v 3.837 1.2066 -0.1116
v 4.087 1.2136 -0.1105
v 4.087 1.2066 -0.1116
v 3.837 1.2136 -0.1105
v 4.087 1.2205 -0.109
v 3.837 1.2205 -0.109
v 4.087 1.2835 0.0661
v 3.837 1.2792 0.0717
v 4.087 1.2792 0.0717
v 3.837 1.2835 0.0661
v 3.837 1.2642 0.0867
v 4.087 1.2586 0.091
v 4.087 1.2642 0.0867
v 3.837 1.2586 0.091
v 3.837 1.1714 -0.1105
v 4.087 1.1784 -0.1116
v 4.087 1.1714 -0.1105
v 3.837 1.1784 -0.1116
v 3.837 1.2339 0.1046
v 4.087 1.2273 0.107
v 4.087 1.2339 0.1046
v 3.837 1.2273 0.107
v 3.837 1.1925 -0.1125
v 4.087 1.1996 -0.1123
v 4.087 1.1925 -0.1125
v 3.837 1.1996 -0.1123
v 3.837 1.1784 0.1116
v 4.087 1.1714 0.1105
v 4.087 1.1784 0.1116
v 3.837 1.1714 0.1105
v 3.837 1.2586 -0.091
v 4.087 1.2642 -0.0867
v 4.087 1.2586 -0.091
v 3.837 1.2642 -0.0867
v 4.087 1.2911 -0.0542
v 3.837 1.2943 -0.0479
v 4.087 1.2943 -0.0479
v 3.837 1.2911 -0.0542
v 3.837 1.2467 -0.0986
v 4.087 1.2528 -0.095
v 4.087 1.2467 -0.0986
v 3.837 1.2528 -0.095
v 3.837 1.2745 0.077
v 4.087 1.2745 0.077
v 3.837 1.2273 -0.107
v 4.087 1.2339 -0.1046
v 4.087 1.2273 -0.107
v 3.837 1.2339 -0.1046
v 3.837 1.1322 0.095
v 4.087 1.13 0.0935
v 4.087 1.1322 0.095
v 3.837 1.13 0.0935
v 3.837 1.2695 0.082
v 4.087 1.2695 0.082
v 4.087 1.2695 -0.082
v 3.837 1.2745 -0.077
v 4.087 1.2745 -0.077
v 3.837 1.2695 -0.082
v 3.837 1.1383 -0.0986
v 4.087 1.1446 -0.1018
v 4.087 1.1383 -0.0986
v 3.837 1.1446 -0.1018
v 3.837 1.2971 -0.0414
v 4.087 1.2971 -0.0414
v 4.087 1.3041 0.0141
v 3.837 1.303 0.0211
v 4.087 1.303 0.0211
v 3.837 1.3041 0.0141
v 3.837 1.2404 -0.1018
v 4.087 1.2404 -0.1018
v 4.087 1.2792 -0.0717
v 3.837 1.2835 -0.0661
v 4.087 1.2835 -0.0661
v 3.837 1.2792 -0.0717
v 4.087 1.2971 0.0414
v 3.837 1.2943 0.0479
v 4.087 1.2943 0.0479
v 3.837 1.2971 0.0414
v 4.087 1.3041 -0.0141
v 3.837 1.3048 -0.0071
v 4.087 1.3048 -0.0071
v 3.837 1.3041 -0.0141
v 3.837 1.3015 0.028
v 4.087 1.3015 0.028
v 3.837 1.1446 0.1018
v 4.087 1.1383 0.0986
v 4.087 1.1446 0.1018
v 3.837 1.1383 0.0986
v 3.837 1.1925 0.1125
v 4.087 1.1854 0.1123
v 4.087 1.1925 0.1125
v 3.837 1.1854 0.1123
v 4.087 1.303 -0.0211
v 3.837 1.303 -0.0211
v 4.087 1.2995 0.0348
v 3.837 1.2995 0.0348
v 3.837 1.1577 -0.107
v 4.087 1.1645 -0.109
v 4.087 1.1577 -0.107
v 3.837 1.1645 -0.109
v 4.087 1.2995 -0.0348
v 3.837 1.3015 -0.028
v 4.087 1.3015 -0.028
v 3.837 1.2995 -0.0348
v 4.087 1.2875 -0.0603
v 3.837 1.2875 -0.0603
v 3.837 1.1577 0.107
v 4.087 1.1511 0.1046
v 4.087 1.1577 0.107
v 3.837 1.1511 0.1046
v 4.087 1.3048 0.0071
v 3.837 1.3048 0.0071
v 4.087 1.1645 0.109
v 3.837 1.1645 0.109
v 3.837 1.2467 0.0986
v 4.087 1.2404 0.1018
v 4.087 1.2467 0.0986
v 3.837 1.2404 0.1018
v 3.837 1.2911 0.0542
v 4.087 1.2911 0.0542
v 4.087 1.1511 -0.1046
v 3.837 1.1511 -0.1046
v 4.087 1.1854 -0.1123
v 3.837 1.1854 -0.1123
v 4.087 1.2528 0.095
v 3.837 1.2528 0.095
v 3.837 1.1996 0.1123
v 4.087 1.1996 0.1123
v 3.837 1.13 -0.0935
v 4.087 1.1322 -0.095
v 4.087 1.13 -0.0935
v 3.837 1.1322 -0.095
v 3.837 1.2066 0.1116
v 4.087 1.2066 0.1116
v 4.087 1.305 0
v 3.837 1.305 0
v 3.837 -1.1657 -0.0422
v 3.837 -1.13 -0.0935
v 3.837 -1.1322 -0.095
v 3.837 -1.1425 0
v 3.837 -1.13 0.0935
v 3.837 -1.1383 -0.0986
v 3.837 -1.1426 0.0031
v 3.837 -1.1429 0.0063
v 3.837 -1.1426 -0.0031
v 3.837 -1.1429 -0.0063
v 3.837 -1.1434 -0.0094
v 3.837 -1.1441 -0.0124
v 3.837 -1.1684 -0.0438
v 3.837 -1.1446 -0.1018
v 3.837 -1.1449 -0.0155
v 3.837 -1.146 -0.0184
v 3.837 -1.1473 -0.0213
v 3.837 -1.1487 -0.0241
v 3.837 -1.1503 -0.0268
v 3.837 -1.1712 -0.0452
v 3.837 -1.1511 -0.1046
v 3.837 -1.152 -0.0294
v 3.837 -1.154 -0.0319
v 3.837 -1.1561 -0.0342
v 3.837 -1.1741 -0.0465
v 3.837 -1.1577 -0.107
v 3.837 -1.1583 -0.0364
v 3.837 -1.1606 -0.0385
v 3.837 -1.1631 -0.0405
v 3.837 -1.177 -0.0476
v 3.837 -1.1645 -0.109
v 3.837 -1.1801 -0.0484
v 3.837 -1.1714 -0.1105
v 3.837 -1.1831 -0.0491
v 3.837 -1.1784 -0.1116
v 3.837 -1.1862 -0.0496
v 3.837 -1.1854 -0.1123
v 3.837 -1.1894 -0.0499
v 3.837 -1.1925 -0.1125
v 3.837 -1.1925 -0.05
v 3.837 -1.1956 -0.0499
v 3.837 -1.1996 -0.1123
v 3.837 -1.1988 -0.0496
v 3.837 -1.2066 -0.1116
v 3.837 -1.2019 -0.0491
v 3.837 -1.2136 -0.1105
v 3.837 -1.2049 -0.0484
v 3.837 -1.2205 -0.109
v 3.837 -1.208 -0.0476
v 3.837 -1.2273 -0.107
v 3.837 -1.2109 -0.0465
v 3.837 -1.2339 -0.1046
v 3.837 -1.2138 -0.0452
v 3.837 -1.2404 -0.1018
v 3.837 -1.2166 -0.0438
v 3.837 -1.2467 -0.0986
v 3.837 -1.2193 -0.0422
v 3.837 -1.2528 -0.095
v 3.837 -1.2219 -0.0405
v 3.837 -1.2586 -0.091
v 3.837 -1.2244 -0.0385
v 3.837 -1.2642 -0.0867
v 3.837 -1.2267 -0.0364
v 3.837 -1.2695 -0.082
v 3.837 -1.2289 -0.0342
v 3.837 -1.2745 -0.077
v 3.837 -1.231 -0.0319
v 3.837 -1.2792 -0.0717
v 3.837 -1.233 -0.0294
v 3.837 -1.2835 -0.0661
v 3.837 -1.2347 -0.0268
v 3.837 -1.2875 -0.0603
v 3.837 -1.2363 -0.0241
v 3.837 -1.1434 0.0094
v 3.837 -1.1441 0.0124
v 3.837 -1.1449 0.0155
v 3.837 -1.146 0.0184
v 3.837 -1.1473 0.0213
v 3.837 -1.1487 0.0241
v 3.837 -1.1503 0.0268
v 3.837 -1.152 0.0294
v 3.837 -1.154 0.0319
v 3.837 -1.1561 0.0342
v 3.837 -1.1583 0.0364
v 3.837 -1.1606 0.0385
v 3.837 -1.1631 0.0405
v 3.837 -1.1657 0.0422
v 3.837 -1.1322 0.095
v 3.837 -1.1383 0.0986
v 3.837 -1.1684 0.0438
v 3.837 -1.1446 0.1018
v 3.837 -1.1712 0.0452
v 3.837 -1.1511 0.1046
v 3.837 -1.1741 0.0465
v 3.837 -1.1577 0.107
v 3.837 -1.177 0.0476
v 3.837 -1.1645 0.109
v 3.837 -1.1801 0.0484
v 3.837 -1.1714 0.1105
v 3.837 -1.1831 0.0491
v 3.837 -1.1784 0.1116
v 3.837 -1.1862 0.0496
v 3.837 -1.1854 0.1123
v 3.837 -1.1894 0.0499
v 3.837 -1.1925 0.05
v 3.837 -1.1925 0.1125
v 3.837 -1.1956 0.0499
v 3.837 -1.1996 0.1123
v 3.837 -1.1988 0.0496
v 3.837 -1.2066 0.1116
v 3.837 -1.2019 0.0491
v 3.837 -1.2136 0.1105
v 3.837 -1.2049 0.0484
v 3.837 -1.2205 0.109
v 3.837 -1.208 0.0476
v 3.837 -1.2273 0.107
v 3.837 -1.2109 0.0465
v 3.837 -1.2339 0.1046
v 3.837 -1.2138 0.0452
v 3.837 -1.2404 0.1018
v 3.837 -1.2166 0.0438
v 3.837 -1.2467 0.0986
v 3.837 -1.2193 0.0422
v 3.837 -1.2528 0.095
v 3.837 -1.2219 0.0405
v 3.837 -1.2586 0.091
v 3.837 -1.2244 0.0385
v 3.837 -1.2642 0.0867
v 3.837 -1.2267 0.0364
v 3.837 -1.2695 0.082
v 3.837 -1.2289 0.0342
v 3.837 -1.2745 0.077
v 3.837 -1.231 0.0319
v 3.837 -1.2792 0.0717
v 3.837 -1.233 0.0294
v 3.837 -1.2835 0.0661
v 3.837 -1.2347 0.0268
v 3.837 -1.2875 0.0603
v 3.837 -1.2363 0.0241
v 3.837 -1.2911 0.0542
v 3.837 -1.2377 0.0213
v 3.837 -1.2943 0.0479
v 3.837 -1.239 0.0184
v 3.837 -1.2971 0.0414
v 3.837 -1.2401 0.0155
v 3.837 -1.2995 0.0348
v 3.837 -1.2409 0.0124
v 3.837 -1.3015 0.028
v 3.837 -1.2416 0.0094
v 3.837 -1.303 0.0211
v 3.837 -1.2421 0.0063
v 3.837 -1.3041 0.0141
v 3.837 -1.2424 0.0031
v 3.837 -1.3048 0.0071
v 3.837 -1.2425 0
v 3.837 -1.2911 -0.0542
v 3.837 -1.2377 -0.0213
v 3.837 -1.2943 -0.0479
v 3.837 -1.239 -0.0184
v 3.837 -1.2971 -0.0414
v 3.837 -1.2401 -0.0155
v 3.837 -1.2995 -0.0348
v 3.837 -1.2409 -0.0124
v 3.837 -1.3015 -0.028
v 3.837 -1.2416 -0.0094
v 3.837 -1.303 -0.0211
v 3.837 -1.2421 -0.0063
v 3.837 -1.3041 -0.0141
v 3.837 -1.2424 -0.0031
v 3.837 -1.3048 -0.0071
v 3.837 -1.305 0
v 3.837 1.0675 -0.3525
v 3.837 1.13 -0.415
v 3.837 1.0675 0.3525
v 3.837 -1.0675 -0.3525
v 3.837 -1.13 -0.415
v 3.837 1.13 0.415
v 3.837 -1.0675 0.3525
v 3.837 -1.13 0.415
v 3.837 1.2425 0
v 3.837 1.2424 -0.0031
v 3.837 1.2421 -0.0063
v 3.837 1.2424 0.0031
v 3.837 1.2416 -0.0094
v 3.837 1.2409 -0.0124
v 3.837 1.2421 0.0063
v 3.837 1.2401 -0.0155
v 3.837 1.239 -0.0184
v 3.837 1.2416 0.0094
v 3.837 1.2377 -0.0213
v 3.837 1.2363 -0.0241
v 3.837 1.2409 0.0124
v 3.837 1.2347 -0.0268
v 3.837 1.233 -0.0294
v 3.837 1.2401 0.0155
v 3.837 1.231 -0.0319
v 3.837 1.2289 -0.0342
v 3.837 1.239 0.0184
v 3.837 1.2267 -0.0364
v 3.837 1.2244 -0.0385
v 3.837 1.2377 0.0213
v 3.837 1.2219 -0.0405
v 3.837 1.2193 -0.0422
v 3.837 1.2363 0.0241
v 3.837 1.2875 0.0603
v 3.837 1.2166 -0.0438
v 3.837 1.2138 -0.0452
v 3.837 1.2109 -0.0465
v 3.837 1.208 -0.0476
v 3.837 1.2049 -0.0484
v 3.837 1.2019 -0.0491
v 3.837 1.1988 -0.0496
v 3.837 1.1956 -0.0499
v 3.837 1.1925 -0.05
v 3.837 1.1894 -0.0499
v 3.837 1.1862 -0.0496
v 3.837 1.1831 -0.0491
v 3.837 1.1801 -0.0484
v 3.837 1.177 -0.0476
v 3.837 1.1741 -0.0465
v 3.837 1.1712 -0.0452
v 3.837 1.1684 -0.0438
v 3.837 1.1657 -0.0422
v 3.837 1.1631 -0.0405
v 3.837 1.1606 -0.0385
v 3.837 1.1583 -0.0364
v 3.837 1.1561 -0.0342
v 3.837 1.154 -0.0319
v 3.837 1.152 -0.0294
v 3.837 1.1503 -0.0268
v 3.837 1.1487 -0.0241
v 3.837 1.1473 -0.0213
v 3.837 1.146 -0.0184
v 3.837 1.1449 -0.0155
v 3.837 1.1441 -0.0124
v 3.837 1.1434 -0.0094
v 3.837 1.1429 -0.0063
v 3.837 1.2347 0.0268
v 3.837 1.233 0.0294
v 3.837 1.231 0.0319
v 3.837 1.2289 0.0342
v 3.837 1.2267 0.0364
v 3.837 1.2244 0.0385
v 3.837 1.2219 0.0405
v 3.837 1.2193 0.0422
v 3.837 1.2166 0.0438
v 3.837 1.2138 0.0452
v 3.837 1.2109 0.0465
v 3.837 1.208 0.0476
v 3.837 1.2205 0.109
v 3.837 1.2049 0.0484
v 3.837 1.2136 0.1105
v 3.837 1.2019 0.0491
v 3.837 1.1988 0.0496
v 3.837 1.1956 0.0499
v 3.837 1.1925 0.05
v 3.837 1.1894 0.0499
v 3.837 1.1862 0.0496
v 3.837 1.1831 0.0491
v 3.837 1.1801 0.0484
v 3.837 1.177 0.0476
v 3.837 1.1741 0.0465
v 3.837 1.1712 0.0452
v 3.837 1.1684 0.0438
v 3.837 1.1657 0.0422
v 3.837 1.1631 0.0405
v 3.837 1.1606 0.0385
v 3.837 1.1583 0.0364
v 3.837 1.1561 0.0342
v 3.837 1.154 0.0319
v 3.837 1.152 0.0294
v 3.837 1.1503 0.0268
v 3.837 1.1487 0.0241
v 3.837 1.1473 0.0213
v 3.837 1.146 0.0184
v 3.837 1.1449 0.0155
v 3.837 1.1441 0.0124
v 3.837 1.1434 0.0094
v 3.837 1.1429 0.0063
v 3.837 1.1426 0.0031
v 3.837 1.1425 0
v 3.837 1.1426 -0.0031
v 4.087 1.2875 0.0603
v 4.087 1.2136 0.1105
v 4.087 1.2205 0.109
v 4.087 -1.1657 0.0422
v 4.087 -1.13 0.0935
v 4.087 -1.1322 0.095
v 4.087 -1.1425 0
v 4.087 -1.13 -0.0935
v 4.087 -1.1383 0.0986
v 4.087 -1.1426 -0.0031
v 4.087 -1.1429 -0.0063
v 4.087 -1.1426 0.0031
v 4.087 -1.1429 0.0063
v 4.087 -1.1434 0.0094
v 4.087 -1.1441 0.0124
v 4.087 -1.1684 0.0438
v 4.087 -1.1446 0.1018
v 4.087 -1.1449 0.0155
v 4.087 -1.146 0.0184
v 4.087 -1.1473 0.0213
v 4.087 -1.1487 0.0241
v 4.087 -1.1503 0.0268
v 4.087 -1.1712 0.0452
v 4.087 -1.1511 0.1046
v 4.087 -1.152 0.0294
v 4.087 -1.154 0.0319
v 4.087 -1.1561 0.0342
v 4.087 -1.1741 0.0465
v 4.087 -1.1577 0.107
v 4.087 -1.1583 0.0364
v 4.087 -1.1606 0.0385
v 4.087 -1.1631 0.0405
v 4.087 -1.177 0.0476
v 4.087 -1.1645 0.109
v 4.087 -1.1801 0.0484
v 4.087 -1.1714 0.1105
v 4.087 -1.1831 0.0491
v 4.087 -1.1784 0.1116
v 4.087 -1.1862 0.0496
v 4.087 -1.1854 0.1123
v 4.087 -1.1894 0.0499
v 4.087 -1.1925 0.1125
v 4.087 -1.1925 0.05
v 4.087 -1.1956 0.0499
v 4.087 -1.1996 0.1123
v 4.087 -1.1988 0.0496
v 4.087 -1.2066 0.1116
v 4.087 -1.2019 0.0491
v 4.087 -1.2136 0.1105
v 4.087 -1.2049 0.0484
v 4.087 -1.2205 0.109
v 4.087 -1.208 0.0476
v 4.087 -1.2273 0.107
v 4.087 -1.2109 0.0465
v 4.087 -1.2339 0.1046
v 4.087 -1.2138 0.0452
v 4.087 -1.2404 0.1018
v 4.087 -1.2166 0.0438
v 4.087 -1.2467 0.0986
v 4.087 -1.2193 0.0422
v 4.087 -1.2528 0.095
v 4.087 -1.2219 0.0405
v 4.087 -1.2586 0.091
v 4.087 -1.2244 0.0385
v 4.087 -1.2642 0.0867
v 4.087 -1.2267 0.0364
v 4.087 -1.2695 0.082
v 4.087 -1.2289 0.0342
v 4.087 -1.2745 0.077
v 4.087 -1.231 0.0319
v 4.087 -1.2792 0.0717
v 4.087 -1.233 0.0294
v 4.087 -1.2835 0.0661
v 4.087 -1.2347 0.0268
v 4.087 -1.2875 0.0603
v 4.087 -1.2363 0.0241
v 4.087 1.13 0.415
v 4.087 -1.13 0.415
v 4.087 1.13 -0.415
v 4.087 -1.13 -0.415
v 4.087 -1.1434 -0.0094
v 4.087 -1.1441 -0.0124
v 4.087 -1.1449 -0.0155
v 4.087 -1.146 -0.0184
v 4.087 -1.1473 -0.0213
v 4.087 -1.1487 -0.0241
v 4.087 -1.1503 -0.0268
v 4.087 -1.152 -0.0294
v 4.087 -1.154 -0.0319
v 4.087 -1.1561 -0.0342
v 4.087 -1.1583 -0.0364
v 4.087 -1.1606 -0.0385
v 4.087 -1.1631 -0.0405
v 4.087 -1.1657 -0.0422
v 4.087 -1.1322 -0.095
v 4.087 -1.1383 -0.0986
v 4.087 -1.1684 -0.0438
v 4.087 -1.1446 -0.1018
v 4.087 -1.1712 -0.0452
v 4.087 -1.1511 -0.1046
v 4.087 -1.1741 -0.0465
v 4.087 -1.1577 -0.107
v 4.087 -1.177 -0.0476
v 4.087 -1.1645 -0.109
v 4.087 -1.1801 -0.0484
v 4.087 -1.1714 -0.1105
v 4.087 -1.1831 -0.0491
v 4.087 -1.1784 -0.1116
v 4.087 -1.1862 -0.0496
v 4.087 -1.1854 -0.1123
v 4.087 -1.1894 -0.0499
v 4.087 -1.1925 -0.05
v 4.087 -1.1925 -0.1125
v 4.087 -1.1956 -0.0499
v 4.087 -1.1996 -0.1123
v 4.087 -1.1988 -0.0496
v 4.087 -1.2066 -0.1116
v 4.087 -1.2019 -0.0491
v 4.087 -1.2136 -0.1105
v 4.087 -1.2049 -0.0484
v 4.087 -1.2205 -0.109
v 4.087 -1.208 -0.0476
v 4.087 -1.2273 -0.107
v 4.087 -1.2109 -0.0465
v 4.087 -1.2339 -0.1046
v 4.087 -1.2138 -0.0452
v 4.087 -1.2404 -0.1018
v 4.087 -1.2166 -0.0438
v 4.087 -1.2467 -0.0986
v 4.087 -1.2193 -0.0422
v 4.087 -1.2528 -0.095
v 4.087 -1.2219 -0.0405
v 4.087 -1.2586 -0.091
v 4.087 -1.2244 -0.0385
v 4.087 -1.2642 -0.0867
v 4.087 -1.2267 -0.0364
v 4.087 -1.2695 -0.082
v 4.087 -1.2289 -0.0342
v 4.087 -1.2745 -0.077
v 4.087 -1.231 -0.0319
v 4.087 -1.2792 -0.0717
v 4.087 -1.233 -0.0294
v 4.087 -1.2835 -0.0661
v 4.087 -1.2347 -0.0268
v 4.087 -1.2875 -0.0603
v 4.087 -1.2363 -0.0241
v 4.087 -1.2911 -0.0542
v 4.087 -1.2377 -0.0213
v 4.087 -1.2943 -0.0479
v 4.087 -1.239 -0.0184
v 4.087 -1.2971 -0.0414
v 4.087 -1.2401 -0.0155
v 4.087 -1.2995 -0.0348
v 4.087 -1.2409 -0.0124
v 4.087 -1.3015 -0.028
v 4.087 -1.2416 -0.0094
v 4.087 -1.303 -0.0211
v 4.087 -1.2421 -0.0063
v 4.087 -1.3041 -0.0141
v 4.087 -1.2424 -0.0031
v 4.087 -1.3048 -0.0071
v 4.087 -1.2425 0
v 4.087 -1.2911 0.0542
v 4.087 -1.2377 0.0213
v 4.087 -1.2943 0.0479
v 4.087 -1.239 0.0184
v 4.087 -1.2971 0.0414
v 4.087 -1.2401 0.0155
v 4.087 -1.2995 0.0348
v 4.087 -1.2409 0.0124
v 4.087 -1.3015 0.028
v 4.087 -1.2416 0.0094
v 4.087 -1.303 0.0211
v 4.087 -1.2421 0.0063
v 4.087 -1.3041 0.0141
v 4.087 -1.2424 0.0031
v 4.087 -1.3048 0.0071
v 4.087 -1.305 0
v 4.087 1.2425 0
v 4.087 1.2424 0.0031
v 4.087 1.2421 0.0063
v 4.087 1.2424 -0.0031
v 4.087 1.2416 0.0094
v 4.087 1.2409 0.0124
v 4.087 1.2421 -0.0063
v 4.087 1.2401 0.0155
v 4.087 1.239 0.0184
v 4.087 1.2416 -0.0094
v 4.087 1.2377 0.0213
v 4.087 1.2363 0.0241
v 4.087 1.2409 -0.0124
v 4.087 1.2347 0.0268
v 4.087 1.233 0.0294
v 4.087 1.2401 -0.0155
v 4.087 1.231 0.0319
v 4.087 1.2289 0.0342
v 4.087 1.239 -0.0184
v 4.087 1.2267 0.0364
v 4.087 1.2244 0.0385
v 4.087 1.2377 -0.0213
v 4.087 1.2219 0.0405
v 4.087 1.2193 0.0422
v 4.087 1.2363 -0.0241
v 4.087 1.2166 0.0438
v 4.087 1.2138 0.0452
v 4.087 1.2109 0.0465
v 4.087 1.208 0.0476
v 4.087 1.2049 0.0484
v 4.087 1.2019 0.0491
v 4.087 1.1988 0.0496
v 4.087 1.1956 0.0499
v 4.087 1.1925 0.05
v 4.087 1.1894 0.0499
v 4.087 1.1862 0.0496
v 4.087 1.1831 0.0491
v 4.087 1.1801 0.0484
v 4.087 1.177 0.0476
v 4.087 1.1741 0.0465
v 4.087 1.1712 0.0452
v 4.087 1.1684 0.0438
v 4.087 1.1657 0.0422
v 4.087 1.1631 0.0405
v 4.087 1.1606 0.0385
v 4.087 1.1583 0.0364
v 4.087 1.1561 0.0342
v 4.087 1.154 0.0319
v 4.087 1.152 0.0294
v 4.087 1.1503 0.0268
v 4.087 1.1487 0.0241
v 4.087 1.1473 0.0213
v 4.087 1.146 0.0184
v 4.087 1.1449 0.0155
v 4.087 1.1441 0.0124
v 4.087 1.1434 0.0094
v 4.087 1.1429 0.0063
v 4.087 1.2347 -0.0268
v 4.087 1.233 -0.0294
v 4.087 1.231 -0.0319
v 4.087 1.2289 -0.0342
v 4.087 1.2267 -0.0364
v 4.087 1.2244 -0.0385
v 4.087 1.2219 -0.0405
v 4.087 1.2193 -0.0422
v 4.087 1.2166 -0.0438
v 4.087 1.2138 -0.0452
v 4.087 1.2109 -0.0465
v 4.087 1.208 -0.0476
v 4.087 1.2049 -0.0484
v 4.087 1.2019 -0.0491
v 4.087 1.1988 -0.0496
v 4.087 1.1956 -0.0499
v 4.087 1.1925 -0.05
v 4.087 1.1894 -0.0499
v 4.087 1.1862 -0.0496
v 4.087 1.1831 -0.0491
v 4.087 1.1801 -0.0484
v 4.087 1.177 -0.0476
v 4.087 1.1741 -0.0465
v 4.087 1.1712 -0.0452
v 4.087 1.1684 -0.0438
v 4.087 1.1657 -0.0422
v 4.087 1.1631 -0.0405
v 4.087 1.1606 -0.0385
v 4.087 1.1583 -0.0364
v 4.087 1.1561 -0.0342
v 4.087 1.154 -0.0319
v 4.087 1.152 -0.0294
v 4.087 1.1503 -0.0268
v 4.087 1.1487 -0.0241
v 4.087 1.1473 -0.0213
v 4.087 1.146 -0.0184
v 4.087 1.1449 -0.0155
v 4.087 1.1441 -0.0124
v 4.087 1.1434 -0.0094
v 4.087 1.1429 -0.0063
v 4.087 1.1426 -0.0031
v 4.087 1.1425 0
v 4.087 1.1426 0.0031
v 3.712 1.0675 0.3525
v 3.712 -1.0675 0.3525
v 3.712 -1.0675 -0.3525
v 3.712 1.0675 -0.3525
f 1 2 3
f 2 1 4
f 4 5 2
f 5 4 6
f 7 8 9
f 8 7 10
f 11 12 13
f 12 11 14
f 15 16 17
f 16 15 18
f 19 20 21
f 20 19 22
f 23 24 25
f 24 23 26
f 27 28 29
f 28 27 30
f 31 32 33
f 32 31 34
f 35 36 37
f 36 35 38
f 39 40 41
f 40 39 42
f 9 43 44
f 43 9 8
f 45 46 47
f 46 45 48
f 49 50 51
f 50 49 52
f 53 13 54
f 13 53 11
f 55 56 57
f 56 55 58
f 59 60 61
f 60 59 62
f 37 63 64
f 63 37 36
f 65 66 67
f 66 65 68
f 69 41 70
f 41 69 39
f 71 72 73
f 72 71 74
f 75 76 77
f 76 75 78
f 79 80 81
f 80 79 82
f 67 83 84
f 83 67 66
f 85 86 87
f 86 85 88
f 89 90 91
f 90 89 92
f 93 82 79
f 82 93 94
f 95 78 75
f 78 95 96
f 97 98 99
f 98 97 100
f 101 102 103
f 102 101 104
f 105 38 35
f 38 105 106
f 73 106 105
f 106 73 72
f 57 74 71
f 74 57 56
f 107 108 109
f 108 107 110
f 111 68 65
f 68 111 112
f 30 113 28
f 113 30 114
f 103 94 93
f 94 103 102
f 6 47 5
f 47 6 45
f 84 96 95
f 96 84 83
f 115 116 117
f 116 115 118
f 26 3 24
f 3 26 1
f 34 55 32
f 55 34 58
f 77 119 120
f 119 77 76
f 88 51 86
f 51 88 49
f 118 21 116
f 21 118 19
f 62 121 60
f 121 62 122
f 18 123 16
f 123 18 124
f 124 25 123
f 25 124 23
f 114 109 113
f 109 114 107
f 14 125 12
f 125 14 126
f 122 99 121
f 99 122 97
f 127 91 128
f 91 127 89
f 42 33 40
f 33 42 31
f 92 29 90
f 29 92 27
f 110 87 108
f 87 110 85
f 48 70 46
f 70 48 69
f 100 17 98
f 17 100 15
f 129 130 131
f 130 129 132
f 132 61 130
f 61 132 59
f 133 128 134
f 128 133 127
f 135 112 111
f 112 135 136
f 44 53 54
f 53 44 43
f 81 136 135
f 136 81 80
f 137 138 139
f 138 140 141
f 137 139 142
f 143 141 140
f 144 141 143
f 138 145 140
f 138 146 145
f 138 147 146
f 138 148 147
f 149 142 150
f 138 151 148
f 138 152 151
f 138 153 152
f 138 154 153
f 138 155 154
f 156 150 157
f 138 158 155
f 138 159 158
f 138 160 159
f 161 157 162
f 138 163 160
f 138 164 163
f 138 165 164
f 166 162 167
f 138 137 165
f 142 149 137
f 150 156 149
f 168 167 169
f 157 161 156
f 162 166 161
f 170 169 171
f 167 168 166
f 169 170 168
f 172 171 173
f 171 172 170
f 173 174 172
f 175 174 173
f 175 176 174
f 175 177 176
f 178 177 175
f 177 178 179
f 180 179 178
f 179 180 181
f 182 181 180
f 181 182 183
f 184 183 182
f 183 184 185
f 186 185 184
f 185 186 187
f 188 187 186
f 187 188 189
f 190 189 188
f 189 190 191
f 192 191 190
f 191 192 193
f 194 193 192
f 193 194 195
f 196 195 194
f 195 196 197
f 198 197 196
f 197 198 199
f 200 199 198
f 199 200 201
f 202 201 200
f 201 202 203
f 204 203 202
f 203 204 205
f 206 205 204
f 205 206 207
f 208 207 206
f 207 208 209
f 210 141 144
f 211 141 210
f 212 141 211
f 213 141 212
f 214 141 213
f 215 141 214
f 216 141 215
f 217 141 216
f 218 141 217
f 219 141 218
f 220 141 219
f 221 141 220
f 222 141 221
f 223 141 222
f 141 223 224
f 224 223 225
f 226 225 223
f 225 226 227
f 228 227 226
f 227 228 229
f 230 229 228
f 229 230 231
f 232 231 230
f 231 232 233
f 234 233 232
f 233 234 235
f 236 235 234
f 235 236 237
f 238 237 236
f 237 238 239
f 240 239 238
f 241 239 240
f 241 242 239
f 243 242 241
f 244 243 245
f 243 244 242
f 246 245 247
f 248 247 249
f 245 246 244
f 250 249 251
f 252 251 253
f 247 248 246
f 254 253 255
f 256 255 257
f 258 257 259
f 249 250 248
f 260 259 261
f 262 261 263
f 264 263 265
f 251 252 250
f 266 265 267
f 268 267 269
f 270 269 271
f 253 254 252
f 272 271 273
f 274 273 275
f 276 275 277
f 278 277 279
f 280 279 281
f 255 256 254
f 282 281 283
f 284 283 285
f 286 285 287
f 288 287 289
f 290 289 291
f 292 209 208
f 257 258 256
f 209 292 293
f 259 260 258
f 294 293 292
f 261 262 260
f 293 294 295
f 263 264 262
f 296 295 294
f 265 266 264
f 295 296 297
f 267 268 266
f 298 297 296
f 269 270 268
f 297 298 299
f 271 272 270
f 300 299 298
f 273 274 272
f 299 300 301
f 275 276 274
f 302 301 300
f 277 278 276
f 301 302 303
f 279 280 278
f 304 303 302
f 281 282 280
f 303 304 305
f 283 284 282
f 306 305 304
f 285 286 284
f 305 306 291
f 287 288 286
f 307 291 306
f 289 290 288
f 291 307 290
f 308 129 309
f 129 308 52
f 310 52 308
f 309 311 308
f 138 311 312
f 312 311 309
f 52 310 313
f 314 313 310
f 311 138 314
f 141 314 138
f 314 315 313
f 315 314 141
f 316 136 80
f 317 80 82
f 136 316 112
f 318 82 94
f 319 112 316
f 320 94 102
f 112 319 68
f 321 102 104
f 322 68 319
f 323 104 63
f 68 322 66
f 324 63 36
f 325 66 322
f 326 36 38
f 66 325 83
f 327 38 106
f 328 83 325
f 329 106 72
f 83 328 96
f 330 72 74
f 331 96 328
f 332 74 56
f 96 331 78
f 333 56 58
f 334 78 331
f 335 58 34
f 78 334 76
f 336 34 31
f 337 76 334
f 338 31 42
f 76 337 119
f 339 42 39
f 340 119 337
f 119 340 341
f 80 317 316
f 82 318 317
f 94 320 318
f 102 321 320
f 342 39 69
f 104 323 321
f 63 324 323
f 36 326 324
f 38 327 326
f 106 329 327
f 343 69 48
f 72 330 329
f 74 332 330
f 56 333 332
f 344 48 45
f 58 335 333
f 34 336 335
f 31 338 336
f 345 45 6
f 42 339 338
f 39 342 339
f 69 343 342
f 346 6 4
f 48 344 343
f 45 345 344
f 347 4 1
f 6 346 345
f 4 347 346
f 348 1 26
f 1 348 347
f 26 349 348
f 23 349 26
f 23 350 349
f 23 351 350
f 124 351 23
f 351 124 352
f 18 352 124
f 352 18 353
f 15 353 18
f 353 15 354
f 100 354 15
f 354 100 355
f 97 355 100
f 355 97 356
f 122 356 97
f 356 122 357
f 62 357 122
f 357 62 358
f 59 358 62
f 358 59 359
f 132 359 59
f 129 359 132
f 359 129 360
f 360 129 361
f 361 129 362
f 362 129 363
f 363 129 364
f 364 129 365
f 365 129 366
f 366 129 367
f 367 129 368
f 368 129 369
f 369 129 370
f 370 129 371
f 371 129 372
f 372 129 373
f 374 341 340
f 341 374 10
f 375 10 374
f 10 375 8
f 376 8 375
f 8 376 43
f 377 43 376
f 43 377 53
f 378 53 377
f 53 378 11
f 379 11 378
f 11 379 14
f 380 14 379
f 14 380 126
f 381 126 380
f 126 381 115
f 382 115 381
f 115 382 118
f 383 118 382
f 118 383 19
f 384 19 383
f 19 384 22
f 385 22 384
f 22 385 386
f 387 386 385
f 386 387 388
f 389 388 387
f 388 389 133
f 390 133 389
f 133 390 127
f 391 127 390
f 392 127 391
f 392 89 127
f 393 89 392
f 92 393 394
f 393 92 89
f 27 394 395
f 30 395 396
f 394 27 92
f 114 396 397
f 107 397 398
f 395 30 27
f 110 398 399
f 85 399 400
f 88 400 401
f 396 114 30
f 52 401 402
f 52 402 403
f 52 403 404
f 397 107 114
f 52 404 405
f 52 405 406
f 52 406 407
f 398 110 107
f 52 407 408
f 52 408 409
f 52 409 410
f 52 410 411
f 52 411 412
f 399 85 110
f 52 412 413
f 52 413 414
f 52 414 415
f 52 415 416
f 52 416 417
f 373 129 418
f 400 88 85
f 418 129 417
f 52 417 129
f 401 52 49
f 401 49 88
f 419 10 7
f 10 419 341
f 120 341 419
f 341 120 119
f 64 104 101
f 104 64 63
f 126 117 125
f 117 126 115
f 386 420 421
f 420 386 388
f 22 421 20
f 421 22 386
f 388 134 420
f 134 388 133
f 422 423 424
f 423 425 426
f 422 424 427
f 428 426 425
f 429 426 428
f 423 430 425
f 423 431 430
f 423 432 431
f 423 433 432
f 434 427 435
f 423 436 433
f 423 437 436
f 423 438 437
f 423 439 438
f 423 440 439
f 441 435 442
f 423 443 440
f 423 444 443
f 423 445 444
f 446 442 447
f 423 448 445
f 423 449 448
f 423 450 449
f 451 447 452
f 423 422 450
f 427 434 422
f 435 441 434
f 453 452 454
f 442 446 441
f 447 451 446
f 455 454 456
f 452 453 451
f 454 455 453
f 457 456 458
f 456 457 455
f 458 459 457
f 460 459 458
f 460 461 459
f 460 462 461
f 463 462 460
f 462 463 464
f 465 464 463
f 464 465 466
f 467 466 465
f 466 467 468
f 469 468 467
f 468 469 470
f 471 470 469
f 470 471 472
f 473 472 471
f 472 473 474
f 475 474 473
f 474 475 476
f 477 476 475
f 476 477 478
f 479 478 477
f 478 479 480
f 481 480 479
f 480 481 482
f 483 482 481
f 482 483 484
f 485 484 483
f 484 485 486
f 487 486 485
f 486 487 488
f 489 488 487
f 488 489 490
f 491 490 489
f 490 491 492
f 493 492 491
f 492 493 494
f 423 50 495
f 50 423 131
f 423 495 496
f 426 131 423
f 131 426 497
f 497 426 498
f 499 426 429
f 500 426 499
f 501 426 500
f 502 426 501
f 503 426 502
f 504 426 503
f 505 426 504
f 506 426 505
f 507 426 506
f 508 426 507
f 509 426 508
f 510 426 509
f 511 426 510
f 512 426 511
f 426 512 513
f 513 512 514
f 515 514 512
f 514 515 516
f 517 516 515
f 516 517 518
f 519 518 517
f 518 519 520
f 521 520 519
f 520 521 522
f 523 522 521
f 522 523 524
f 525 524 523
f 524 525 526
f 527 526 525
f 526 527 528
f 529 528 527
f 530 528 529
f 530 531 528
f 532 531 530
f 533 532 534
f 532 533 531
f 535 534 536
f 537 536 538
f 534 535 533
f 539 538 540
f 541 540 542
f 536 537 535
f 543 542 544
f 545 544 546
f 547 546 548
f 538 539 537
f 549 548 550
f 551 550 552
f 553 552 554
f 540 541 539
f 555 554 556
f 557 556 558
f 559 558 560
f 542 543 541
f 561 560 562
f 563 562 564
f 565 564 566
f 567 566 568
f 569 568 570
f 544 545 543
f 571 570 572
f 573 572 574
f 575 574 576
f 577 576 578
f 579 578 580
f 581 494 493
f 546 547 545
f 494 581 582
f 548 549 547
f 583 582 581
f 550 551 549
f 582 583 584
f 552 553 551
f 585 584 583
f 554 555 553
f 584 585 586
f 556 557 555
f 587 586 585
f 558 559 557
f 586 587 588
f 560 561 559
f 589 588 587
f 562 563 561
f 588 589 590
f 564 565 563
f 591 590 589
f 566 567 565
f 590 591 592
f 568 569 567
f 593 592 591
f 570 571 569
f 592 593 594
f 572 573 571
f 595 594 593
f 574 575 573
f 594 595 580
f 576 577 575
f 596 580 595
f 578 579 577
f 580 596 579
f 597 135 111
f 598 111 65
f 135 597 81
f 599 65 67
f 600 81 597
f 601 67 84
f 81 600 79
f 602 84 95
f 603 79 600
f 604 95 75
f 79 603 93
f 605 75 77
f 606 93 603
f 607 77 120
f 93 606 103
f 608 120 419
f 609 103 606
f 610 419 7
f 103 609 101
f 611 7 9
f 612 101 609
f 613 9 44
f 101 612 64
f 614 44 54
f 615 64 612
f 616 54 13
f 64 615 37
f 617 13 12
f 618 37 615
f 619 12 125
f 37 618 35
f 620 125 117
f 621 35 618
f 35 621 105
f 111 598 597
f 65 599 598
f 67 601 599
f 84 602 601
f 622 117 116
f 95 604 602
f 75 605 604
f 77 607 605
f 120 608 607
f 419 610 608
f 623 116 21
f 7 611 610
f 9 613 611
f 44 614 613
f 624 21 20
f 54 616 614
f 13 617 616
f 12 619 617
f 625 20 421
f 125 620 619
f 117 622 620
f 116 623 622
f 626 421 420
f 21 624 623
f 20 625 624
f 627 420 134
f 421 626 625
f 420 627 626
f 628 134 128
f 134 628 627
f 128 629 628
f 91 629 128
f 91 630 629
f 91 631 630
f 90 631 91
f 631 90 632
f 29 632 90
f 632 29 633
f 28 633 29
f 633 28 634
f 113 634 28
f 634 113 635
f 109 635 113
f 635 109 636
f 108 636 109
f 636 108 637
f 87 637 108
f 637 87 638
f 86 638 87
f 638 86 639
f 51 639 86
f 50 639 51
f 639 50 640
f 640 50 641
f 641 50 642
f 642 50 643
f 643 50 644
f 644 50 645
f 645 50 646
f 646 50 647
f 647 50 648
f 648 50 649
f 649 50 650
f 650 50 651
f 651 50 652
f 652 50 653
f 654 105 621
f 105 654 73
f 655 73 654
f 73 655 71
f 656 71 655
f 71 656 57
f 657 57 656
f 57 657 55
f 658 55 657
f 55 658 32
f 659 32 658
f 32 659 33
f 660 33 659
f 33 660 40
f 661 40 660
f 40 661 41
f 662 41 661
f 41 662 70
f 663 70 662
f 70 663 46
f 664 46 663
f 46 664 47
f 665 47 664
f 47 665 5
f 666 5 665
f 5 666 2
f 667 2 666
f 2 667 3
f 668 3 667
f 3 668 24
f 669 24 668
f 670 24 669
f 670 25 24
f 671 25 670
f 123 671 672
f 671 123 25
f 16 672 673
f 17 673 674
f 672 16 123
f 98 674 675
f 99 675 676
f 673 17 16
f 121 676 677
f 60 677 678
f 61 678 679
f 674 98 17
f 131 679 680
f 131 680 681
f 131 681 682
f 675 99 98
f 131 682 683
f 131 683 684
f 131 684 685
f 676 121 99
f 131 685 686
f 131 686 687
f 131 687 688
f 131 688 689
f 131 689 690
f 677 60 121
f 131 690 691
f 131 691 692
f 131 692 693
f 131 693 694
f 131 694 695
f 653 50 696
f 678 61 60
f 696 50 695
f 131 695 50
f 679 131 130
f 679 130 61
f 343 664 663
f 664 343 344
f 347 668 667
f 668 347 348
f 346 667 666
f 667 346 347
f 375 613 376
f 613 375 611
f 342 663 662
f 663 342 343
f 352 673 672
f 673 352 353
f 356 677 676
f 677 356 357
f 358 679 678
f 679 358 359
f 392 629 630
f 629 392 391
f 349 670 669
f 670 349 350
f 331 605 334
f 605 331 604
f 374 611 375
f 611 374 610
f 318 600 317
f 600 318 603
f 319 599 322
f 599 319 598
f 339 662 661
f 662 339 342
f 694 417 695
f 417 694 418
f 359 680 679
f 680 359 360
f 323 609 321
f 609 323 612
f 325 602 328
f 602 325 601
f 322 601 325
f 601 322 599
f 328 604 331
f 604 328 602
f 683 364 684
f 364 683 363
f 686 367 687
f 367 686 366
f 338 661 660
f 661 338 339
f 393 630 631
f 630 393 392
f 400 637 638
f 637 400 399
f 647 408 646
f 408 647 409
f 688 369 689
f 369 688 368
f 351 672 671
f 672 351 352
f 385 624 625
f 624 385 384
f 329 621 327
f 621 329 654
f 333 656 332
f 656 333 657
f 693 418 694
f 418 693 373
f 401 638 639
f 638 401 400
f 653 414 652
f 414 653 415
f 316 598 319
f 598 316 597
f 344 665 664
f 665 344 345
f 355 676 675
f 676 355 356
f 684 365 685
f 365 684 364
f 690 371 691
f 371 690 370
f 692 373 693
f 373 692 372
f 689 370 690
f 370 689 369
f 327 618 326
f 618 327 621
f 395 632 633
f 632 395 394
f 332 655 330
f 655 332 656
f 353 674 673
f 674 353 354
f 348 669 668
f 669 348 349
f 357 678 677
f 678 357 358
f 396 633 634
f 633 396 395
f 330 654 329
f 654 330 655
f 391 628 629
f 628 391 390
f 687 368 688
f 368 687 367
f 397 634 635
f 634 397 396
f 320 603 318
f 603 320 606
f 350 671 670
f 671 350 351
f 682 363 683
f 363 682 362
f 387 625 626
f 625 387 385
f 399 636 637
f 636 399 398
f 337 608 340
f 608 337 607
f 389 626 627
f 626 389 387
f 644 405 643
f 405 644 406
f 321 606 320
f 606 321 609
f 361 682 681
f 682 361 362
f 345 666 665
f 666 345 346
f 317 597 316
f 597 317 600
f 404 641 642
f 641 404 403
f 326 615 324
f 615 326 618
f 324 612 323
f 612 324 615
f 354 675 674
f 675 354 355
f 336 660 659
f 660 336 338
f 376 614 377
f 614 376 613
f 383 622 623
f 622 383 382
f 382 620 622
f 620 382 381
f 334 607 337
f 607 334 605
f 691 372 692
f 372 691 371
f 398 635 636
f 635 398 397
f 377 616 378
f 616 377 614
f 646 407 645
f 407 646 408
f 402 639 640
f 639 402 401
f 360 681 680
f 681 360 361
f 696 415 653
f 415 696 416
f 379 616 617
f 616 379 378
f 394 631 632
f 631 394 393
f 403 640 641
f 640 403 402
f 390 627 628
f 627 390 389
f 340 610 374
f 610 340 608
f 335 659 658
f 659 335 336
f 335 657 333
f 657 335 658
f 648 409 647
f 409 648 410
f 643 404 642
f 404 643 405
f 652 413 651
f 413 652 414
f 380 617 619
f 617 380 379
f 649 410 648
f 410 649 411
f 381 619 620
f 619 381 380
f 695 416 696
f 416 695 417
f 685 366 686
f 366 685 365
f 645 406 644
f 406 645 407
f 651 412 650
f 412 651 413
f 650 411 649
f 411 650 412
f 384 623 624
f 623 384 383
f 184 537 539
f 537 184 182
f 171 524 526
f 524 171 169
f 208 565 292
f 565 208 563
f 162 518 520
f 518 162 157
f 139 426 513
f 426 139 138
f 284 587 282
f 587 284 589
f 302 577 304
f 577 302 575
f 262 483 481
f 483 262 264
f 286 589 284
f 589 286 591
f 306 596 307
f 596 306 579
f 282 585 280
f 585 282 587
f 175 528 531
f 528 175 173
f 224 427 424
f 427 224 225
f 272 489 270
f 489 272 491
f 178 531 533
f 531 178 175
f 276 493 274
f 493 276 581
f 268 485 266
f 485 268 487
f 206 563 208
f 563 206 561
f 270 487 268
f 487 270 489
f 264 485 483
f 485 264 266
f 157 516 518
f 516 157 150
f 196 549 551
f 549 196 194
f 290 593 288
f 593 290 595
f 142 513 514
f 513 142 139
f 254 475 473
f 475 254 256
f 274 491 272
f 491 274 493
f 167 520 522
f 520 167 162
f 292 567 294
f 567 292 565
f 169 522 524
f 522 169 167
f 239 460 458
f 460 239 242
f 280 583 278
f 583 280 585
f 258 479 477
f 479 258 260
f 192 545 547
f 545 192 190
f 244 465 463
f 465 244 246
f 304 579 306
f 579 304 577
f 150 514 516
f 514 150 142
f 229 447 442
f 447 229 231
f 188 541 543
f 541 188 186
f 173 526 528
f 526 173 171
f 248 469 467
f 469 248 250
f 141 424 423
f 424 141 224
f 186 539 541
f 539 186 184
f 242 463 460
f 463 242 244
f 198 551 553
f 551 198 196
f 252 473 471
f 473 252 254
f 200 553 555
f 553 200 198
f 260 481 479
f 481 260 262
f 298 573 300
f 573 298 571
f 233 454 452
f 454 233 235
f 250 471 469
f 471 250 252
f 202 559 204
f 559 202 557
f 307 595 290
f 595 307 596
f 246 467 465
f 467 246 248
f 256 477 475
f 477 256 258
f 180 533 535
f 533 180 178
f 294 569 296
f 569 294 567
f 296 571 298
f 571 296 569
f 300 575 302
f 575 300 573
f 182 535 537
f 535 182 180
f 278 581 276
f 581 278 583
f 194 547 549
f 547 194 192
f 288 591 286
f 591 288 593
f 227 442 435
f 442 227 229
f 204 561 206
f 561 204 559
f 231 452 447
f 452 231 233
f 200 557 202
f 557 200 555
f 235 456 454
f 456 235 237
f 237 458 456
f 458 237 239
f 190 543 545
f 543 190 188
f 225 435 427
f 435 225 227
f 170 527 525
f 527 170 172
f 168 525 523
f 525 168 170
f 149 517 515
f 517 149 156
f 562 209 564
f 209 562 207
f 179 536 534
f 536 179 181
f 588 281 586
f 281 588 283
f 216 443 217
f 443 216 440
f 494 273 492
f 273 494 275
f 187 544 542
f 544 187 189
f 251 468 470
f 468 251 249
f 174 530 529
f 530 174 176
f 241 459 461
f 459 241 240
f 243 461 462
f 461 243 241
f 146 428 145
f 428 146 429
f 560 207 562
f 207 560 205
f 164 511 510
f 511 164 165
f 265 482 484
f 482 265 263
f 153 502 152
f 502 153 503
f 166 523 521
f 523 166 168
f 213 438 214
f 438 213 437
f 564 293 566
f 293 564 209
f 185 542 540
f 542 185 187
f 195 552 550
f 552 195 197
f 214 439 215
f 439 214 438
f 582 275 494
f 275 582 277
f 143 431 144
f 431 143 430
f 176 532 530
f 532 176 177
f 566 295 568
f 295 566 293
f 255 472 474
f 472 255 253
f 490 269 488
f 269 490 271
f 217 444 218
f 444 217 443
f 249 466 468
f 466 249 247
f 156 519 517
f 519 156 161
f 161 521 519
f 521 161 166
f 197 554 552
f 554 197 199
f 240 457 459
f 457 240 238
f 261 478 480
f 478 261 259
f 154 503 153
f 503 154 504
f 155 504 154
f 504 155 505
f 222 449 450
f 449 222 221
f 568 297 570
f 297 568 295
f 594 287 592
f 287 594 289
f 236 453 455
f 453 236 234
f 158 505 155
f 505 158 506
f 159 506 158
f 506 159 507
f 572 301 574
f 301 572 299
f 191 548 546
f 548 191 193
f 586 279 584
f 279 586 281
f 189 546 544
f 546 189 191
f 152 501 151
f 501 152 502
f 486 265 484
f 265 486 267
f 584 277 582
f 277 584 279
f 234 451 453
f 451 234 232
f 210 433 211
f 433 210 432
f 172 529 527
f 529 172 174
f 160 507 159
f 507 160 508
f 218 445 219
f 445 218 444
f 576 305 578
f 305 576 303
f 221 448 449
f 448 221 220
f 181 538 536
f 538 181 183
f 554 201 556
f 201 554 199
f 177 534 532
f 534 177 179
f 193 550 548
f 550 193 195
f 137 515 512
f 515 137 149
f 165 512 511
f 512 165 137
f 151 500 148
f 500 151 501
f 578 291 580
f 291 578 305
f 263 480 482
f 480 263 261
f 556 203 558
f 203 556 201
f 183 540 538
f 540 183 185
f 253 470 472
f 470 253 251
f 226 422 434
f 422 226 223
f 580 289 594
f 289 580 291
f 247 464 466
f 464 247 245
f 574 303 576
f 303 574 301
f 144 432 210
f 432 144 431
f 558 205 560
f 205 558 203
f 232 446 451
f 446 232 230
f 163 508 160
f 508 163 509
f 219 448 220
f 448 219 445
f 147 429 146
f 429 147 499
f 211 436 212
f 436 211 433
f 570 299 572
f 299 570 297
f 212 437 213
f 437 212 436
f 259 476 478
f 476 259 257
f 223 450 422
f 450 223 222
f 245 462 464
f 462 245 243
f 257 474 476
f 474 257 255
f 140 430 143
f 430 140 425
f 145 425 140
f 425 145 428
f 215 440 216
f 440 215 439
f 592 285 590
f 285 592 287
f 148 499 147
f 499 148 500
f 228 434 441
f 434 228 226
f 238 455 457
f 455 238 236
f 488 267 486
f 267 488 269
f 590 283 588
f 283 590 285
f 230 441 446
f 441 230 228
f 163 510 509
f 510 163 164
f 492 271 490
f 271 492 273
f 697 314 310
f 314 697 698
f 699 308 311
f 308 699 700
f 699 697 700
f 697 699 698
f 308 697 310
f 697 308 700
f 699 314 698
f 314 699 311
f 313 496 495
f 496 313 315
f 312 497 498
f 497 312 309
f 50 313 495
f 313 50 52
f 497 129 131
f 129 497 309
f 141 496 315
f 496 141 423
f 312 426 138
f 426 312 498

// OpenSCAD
board_x = 3.605;
board_y = 2.135;
board_z = 0.705;
top_heat_sink_x = 2.0;
top_heat_sink_y = 1.8;
bottom_heat_sink_x = 3;
bottom_heat_sink_y = 1.8;
//figure out whether to to trim power/data port board for height
//pow_data_port_z = 1.364;
pow_data_port_z = 0.5;
pow_data_port_x = 0.232;
x = board_x + pow_data_port_x;
y = board_y;
z = max(board_z,pow_data_port_z);
pow_data_port_diameter = 0.545;
pow_data_port_separation = 1.0;
led_diameter = 0.228;
antenna_diameter = 0.228;
antenna_separation = 1.6;
screw_radius = 0.05;
screw_length = 0.5;
cap_offset = x;

wall_thickness = 1/8;

union()
{
    //back cover
    translate([cap_offset,0,0]) {cube([wall_thickness*2,y,z],center = true);}
    translate([cap_offset+wall_thickness,0,0]) {cube([wall_thickness*2,y+wall_thickness,z+wall_thickness],center = true);}
    //screw cavities on side
    difference()
    {
        translate([cap_offset+ wall_thickness,(y/2+wall_thickness),0]) {rotate([0,90,0]){cylinder(h=2*wall_thickness,r = screw_radius + wall_thickness/2, $fn=100, center = true);}}
        translate([cap_offset+ wall_thickness,(y/2+wall_thickness),0]) {rotate([0,90,0]){cylinder(h=3*wall_thickness,r = screw_radius, $fn=100, center = true);}}
    }
    difference()
    {
        translate([cap_offset+ wall_thickness,-(y/2+wall_thickness),0]) {rotate([0,90,0]){cylinder(h=2*wall_thickness, r = screw_radius + wall_thickness/2, $fn=100, center = true);}}
        translate([cap_offset+ wall_thickness,-(y/2+wall_thickness),0]) {rotate([0,90,0]){cylinder(h=3*wall_thickness, r = screw_radius, $fn=100, center = true);}}
    }
    
    
}
